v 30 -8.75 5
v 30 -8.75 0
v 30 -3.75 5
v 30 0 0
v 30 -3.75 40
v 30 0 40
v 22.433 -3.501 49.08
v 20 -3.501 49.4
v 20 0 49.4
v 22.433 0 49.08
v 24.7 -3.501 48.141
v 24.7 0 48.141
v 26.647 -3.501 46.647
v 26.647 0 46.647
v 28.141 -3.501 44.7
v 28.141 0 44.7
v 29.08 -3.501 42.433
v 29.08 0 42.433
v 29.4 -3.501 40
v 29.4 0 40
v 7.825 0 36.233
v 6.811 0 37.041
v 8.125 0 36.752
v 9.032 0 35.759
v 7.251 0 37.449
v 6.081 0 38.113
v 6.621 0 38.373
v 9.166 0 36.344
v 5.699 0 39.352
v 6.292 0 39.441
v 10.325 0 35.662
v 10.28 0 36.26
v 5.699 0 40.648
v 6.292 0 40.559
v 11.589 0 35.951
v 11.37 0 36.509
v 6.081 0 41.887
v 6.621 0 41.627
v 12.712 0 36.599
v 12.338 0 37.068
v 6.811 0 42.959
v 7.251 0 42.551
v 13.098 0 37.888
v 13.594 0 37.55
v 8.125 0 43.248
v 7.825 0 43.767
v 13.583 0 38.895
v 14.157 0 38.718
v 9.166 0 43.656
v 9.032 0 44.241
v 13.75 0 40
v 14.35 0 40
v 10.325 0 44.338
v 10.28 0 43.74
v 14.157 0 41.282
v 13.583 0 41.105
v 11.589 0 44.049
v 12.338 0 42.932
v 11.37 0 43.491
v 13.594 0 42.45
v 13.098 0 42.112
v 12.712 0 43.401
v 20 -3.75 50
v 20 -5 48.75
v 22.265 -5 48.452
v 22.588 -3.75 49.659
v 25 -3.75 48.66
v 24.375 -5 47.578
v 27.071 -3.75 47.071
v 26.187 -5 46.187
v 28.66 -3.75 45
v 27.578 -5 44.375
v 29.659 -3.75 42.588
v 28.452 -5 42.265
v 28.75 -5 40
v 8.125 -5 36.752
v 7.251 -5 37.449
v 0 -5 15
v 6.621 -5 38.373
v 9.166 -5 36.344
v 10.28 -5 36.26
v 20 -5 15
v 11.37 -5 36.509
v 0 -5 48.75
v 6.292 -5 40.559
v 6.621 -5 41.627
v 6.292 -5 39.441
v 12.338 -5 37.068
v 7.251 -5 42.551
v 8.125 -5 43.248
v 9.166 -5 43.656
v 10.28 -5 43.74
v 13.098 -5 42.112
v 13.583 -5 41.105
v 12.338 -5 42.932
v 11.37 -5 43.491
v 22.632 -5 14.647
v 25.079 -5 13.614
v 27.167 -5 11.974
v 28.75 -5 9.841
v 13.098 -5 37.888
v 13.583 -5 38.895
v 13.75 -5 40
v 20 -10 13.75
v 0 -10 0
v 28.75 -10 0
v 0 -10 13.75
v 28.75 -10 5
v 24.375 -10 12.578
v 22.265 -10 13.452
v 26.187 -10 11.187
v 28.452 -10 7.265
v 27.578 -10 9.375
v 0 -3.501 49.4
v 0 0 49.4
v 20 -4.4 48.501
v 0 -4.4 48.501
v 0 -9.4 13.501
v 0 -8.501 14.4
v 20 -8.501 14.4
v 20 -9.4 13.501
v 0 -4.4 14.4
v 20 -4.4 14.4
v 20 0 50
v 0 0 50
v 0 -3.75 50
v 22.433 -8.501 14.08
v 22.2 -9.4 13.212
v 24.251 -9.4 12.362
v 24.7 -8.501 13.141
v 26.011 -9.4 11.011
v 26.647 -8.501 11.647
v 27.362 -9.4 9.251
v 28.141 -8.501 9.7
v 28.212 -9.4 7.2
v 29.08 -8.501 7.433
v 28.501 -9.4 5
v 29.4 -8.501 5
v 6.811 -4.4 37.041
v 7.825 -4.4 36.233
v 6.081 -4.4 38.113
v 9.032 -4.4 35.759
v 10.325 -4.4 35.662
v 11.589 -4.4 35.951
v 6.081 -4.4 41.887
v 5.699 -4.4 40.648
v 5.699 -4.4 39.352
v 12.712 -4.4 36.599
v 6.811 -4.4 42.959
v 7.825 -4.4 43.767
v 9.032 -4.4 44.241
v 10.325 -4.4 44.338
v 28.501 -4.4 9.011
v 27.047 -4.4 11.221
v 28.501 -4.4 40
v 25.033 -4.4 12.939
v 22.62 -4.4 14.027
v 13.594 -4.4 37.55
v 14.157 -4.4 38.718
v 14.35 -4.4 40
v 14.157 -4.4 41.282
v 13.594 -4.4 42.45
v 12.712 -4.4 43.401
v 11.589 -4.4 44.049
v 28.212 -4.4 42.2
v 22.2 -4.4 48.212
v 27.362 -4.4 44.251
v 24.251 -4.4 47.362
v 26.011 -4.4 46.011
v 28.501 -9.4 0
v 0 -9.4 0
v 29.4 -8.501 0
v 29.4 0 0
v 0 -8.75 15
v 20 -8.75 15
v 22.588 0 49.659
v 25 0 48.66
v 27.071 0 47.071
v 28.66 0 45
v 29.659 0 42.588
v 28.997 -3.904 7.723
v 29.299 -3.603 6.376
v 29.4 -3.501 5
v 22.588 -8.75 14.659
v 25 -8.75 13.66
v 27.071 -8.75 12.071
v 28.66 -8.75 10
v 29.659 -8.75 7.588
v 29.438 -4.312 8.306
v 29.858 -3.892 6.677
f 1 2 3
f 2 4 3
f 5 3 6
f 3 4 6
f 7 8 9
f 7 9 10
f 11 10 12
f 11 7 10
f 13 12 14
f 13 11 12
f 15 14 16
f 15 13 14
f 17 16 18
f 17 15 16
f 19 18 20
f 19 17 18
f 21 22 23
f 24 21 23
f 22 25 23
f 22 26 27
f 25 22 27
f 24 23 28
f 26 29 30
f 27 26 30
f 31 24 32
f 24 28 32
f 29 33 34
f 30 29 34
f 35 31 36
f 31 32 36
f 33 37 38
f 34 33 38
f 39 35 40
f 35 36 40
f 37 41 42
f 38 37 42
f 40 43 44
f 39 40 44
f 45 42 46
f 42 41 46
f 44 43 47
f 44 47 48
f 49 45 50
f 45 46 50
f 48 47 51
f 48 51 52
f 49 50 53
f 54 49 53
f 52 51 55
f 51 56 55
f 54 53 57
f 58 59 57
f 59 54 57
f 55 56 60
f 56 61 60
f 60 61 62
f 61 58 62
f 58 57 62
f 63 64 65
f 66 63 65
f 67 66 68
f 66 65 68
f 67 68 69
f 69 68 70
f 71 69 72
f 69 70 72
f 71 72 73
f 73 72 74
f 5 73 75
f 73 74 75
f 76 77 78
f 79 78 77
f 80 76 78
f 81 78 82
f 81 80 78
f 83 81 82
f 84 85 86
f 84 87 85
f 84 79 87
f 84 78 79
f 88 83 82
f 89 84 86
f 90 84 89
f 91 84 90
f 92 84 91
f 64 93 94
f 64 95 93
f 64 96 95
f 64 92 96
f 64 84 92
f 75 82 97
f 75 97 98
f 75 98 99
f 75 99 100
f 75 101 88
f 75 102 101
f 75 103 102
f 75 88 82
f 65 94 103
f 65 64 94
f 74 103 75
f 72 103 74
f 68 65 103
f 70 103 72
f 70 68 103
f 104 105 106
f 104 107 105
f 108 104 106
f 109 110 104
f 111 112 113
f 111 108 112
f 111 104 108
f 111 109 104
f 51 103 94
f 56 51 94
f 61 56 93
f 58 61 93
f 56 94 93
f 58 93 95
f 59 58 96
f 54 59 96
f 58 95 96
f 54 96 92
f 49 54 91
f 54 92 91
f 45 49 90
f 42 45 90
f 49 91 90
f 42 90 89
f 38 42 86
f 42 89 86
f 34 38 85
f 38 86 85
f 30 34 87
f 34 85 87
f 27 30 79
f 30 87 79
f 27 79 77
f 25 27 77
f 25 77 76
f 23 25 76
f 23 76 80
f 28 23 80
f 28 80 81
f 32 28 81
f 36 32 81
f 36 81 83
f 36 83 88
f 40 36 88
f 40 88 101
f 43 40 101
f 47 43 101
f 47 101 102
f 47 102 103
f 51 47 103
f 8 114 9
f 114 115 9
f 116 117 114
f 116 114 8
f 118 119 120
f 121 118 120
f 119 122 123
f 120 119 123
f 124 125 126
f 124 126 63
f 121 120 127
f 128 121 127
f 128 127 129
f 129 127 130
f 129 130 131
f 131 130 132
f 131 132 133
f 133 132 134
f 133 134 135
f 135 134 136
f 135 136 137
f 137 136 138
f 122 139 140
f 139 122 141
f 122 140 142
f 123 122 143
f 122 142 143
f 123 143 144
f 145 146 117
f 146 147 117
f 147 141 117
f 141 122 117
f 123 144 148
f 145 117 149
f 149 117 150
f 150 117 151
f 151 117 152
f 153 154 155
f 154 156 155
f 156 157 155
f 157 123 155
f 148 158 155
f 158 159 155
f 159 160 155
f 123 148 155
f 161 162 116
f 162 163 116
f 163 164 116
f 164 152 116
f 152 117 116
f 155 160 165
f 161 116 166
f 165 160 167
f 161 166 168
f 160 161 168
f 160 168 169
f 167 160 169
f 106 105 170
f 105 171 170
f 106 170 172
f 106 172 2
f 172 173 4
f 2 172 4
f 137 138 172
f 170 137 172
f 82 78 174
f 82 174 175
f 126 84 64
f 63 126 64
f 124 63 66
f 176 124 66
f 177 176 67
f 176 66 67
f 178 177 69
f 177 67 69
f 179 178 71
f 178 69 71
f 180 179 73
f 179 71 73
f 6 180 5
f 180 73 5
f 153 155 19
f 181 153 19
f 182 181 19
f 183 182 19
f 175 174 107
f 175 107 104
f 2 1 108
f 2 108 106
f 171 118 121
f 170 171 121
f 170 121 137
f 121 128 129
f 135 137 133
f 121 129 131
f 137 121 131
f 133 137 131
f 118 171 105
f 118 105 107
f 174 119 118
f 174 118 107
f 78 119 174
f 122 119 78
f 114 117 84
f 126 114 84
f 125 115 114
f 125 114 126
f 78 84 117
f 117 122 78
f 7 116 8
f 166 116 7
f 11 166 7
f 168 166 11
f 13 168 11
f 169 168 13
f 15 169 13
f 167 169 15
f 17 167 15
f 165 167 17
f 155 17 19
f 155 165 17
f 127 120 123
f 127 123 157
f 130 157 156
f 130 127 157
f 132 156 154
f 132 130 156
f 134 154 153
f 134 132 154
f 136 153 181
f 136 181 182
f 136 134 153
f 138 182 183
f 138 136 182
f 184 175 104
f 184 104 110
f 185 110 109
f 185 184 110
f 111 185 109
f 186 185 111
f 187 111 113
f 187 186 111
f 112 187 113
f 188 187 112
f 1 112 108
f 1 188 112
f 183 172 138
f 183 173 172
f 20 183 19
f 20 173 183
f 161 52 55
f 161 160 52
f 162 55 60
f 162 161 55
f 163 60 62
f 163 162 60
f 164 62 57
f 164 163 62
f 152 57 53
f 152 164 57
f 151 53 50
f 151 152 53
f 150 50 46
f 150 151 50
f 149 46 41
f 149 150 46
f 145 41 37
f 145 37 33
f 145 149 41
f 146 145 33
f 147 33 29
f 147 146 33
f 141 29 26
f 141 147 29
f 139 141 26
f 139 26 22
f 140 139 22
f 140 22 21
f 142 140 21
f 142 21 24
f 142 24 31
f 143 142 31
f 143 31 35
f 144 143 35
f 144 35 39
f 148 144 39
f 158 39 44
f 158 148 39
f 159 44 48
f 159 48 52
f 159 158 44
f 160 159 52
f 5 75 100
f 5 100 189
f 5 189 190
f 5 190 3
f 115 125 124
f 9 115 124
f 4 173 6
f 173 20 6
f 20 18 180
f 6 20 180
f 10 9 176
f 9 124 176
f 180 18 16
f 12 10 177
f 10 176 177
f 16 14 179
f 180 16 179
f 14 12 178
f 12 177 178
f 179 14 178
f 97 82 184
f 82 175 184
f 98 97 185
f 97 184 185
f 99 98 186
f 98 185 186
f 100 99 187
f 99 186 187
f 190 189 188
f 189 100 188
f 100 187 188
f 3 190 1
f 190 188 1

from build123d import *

# Parameters (mm, degrees)
F0_W     = 30
F0_H     = 50
F1_DEPTH = 5
F2_W     = 30
F2_H     = 15
F3_DEPTH = 5
F4_R     = 3.75
F5_DEPTH = 5.001
F6_R     = 10
F7_SIZE  = 1.25
F8_T     = -0.6


with BuildPart() as f1:
    # F0 (on Front) → F1 (new body)
    with BuildSketch(Plane.XZ):
        with Locations((15, 25)):
            Rectangle(F0_W, F0_H)
    extrude(amount=F1_DEPTH)

    # F2 (on face) → F3 (join)
    with BuildSketch(Plane.XZ.offset(5)):
        with Locations((15, 7.5)):
            Rectangle(F2_W, F2_H)
    extrude(amount=F3_DEPTH)

    # F4 (on face) → F5 (cut, through all)
    with BuildSketch(Plane.XZ.offset(5)):
        with Locations((10, 40)):
            Circle(F4_R)
    extrude(amount=-F5_DEPTH, mode=Mode.SUBTRACT)

    # F6
    f6_edges = [f1.edges().sort_by_distance(p)[0] for p in [
        (30, -2.5, 50),
        (30, -7.5, 15),
    ]]
    fillet(f6_edges, radius=F6_R)

    # F7
    f7_edges = [f1.edges().sort_by_distance(p)[0] for p in [
        (10, -5, 50),
        (10, -10, 15),
    ]]
    chamfer(f7_edges, length=F7_SIZE)

    # F8
    f8_openings = [f1.faces().sort_by_distance(p)[0] for p in [
        (14.961923, -4.988033, 0),
        (0, -3.637279, 20.90781),
        (14.962998, 0, 24.197378),
    ]]
    offset(amount=F8_T, openings=f8_openings, kind=Kind.INTERSECTION)


solid = f1.part
